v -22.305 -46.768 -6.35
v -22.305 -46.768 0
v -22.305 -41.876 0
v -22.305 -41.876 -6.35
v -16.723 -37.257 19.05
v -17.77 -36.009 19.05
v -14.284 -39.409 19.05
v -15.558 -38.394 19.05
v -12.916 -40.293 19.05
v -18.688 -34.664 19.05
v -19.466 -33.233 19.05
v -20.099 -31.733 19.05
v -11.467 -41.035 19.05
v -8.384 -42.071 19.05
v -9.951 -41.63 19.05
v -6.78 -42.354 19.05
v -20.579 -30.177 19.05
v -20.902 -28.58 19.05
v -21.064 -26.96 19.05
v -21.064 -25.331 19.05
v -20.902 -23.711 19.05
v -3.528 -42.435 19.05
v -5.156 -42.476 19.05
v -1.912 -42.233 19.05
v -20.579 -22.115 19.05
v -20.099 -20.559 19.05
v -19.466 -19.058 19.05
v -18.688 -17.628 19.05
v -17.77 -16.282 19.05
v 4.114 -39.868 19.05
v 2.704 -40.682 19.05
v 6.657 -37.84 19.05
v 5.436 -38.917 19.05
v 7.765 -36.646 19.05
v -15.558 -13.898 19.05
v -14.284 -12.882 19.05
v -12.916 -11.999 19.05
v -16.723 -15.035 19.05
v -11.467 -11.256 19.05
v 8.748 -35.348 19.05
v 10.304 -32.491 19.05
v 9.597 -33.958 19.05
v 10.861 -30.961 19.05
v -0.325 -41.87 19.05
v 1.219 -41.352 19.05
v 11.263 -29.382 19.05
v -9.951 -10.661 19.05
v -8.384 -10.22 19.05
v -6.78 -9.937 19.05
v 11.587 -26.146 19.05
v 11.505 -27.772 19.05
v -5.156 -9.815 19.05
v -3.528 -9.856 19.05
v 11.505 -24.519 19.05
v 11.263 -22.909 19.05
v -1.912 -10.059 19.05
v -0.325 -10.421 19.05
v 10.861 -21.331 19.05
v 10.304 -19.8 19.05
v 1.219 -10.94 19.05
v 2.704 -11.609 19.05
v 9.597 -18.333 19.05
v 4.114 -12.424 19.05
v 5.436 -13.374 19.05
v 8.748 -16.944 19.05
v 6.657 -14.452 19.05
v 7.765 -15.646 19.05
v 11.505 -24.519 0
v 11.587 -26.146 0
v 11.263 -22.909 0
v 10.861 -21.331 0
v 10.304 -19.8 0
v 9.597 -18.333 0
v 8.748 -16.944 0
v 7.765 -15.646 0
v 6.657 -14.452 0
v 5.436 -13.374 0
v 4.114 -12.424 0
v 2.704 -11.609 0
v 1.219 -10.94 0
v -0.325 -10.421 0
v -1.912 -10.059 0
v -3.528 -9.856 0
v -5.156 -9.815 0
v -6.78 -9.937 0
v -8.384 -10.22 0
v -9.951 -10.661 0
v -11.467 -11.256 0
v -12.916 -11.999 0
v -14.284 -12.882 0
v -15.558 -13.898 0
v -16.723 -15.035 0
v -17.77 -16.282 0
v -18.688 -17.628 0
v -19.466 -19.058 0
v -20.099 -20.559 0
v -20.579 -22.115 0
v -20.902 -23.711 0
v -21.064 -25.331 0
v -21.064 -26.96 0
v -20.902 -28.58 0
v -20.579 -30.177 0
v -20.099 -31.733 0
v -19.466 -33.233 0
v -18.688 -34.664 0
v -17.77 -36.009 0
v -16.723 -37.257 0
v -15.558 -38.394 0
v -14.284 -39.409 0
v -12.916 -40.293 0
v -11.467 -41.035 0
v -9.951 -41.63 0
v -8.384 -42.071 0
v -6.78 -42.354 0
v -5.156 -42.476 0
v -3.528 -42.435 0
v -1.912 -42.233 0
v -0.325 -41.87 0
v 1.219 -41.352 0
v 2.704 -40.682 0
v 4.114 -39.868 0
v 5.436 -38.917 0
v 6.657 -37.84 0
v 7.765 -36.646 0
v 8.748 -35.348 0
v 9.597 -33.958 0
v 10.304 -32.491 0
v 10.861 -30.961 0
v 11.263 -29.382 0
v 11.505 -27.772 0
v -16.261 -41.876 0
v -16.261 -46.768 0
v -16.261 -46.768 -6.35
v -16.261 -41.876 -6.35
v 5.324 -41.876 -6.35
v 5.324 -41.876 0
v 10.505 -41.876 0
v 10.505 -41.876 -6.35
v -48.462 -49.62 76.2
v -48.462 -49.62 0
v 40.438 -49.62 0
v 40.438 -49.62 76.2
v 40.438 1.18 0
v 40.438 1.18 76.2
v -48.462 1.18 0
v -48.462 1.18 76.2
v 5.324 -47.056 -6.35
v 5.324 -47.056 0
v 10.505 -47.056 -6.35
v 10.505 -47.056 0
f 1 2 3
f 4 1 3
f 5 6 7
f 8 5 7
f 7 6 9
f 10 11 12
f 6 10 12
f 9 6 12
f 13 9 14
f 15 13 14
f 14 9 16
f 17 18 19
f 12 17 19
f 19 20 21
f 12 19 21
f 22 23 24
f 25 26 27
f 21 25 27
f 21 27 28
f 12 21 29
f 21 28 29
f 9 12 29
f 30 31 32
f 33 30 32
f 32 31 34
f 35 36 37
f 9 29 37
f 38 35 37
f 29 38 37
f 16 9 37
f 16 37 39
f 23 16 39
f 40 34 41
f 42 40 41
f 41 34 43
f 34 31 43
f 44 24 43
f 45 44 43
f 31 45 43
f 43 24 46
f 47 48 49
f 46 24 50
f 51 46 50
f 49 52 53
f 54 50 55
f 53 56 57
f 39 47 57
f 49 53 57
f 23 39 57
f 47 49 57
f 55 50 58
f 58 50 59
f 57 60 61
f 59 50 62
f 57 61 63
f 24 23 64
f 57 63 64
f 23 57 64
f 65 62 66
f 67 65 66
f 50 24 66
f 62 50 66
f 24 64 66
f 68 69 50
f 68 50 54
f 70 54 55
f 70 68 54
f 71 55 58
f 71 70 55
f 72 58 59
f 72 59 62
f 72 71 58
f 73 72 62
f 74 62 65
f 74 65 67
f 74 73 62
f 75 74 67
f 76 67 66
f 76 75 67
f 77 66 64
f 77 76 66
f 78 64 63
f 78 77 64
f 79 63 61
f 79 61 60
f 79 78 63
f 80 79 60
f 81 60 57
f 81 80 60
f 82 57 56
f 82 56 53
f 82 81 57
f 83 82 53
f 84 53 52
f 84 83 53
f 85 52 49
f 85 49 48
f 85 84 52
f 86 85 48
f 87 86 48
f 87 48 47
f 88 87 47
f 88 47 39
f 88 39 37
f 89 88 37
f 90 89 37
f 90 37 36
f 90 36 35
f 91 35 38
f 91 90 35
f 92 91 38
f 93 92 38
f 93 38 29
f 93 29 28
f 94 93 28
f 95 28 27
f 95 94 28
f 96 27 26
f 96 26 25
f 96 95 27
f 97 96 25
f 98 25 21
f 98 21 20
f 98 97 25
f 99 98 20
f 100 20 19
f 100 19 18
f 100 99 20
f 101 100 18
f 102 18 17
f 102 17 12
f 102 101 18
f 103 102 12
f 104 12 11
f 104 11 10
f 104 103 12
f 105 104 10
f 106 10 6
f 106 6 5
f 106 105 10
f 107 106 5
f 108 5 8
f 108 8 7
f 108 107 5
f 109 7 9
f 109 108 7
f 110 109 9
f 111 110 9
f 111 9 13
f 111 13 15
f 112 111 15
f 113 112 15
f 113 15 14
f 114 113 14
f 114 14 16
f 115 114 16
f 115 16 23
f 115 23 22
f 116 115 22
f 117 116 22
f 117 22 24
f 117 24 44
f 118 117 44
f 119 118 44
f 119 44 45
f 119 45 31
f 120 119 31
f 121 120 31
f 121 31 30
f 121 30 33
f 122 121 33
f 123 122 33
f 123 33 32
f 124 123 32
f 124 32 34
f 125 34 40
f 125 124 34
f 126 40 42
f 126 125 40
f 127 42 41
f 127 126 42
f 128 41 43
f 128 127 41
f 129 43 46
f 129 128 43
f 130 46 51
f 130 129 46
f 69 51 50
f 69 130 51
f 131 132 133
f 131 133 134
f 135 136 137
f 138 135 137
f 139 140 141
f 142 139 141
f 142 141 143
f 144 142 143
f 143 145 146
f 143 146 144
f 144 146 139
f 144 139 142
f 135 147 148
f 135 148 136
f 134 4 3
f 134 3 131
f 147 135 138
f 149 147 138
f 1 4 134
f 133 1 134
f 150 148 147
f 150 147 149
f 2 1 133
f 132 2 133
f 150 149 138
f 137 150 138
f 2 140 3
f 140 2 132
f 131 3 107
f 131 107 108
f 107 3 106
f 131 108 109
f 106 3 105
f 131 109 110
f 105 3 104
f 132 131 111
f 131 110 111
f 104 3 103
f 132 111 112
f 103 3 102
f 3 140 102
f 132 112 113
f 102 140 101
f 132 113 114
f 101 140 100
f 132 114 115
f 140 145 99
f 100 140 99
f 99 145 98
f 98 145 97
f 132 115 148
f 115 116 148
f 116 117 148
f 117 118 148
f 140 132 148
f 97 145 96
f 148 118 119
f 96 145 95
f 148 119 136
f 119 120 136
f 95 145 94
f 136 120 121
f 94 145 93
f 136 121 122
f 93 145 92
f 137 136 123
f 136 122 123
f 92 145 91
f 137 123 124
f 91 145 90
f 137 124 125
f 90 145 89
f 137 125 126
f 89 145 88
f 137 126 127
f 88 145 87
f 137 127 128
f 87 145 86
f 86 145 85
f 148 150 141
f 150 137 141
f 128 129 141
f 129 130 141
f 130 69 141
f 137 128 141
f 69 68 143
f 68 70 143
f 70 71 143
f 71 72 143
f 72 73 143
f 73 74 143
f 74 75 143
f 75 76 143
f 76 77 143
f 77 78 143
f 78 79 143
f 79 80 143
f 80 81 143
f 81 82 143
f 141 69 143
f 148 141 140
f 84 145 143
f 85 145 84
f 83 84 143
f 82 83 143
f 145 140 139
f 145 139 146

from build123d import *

# Parameters (mm, degrees)
F0_W     = 88.9
F0_H     = 50.8
F1_DEPTH = 76.2
F2_R     = 16.335339
F3_DEPTH = 19.05
F4_W     = 4.892699
F4_H     = 4.604891
F4_W_2   = 4.317085
F4_H_2   = 4.029282
F5_DEPTH = 12.7
F6_W     = 6.043921
F6_H     = 4.892695
F6_W_2   = 5.180505
F6_H_2   = 5.1805
F7_DEPTH = 6.35


with BuildPart() as f1:
    # F0 (on Top) → F1 (new body)
    with BuildSketch(Plane.XY):
        with Locations((-4.012393, -24.22007)):
            Rectangle(F0_W, F0_H)
    extrude(amount=F1_DEPTH)

    # F2 (on Top) → F3 (cut)
    with BuildSketch(Plane.XY):
        with Locations((-4.748795, -26.145704)):
            Circle(F2_R)
    extrude(amount=F3_DEPTH, mode=Mode.SUBTRACT)

    # F4 (on Top) → F5 (join)
    with BuildSketch(Plane.XY):
        with Locations((-21.873237, -44.178185)):
            Rectangle(F4_W, F4_H)
        with Locations((9.785395, -44.178184)):
            Rectangle(F4_W_2, F4_H_2)
    extrude(amount=F5_DEPTH)

    # F6 (on Top) → F7 (join)
    with BuildSketch(Plane.XY):
        with Locations((-19.282984, -44.322086)):
            Rectangle(F6_W, F6_H)
        with Locations((7.914659, -44.465989)):
            Rectangle(F6_W_2, F6_H_2)
    extrude(amount=-F7_DEPTH)


solid = f1.part
